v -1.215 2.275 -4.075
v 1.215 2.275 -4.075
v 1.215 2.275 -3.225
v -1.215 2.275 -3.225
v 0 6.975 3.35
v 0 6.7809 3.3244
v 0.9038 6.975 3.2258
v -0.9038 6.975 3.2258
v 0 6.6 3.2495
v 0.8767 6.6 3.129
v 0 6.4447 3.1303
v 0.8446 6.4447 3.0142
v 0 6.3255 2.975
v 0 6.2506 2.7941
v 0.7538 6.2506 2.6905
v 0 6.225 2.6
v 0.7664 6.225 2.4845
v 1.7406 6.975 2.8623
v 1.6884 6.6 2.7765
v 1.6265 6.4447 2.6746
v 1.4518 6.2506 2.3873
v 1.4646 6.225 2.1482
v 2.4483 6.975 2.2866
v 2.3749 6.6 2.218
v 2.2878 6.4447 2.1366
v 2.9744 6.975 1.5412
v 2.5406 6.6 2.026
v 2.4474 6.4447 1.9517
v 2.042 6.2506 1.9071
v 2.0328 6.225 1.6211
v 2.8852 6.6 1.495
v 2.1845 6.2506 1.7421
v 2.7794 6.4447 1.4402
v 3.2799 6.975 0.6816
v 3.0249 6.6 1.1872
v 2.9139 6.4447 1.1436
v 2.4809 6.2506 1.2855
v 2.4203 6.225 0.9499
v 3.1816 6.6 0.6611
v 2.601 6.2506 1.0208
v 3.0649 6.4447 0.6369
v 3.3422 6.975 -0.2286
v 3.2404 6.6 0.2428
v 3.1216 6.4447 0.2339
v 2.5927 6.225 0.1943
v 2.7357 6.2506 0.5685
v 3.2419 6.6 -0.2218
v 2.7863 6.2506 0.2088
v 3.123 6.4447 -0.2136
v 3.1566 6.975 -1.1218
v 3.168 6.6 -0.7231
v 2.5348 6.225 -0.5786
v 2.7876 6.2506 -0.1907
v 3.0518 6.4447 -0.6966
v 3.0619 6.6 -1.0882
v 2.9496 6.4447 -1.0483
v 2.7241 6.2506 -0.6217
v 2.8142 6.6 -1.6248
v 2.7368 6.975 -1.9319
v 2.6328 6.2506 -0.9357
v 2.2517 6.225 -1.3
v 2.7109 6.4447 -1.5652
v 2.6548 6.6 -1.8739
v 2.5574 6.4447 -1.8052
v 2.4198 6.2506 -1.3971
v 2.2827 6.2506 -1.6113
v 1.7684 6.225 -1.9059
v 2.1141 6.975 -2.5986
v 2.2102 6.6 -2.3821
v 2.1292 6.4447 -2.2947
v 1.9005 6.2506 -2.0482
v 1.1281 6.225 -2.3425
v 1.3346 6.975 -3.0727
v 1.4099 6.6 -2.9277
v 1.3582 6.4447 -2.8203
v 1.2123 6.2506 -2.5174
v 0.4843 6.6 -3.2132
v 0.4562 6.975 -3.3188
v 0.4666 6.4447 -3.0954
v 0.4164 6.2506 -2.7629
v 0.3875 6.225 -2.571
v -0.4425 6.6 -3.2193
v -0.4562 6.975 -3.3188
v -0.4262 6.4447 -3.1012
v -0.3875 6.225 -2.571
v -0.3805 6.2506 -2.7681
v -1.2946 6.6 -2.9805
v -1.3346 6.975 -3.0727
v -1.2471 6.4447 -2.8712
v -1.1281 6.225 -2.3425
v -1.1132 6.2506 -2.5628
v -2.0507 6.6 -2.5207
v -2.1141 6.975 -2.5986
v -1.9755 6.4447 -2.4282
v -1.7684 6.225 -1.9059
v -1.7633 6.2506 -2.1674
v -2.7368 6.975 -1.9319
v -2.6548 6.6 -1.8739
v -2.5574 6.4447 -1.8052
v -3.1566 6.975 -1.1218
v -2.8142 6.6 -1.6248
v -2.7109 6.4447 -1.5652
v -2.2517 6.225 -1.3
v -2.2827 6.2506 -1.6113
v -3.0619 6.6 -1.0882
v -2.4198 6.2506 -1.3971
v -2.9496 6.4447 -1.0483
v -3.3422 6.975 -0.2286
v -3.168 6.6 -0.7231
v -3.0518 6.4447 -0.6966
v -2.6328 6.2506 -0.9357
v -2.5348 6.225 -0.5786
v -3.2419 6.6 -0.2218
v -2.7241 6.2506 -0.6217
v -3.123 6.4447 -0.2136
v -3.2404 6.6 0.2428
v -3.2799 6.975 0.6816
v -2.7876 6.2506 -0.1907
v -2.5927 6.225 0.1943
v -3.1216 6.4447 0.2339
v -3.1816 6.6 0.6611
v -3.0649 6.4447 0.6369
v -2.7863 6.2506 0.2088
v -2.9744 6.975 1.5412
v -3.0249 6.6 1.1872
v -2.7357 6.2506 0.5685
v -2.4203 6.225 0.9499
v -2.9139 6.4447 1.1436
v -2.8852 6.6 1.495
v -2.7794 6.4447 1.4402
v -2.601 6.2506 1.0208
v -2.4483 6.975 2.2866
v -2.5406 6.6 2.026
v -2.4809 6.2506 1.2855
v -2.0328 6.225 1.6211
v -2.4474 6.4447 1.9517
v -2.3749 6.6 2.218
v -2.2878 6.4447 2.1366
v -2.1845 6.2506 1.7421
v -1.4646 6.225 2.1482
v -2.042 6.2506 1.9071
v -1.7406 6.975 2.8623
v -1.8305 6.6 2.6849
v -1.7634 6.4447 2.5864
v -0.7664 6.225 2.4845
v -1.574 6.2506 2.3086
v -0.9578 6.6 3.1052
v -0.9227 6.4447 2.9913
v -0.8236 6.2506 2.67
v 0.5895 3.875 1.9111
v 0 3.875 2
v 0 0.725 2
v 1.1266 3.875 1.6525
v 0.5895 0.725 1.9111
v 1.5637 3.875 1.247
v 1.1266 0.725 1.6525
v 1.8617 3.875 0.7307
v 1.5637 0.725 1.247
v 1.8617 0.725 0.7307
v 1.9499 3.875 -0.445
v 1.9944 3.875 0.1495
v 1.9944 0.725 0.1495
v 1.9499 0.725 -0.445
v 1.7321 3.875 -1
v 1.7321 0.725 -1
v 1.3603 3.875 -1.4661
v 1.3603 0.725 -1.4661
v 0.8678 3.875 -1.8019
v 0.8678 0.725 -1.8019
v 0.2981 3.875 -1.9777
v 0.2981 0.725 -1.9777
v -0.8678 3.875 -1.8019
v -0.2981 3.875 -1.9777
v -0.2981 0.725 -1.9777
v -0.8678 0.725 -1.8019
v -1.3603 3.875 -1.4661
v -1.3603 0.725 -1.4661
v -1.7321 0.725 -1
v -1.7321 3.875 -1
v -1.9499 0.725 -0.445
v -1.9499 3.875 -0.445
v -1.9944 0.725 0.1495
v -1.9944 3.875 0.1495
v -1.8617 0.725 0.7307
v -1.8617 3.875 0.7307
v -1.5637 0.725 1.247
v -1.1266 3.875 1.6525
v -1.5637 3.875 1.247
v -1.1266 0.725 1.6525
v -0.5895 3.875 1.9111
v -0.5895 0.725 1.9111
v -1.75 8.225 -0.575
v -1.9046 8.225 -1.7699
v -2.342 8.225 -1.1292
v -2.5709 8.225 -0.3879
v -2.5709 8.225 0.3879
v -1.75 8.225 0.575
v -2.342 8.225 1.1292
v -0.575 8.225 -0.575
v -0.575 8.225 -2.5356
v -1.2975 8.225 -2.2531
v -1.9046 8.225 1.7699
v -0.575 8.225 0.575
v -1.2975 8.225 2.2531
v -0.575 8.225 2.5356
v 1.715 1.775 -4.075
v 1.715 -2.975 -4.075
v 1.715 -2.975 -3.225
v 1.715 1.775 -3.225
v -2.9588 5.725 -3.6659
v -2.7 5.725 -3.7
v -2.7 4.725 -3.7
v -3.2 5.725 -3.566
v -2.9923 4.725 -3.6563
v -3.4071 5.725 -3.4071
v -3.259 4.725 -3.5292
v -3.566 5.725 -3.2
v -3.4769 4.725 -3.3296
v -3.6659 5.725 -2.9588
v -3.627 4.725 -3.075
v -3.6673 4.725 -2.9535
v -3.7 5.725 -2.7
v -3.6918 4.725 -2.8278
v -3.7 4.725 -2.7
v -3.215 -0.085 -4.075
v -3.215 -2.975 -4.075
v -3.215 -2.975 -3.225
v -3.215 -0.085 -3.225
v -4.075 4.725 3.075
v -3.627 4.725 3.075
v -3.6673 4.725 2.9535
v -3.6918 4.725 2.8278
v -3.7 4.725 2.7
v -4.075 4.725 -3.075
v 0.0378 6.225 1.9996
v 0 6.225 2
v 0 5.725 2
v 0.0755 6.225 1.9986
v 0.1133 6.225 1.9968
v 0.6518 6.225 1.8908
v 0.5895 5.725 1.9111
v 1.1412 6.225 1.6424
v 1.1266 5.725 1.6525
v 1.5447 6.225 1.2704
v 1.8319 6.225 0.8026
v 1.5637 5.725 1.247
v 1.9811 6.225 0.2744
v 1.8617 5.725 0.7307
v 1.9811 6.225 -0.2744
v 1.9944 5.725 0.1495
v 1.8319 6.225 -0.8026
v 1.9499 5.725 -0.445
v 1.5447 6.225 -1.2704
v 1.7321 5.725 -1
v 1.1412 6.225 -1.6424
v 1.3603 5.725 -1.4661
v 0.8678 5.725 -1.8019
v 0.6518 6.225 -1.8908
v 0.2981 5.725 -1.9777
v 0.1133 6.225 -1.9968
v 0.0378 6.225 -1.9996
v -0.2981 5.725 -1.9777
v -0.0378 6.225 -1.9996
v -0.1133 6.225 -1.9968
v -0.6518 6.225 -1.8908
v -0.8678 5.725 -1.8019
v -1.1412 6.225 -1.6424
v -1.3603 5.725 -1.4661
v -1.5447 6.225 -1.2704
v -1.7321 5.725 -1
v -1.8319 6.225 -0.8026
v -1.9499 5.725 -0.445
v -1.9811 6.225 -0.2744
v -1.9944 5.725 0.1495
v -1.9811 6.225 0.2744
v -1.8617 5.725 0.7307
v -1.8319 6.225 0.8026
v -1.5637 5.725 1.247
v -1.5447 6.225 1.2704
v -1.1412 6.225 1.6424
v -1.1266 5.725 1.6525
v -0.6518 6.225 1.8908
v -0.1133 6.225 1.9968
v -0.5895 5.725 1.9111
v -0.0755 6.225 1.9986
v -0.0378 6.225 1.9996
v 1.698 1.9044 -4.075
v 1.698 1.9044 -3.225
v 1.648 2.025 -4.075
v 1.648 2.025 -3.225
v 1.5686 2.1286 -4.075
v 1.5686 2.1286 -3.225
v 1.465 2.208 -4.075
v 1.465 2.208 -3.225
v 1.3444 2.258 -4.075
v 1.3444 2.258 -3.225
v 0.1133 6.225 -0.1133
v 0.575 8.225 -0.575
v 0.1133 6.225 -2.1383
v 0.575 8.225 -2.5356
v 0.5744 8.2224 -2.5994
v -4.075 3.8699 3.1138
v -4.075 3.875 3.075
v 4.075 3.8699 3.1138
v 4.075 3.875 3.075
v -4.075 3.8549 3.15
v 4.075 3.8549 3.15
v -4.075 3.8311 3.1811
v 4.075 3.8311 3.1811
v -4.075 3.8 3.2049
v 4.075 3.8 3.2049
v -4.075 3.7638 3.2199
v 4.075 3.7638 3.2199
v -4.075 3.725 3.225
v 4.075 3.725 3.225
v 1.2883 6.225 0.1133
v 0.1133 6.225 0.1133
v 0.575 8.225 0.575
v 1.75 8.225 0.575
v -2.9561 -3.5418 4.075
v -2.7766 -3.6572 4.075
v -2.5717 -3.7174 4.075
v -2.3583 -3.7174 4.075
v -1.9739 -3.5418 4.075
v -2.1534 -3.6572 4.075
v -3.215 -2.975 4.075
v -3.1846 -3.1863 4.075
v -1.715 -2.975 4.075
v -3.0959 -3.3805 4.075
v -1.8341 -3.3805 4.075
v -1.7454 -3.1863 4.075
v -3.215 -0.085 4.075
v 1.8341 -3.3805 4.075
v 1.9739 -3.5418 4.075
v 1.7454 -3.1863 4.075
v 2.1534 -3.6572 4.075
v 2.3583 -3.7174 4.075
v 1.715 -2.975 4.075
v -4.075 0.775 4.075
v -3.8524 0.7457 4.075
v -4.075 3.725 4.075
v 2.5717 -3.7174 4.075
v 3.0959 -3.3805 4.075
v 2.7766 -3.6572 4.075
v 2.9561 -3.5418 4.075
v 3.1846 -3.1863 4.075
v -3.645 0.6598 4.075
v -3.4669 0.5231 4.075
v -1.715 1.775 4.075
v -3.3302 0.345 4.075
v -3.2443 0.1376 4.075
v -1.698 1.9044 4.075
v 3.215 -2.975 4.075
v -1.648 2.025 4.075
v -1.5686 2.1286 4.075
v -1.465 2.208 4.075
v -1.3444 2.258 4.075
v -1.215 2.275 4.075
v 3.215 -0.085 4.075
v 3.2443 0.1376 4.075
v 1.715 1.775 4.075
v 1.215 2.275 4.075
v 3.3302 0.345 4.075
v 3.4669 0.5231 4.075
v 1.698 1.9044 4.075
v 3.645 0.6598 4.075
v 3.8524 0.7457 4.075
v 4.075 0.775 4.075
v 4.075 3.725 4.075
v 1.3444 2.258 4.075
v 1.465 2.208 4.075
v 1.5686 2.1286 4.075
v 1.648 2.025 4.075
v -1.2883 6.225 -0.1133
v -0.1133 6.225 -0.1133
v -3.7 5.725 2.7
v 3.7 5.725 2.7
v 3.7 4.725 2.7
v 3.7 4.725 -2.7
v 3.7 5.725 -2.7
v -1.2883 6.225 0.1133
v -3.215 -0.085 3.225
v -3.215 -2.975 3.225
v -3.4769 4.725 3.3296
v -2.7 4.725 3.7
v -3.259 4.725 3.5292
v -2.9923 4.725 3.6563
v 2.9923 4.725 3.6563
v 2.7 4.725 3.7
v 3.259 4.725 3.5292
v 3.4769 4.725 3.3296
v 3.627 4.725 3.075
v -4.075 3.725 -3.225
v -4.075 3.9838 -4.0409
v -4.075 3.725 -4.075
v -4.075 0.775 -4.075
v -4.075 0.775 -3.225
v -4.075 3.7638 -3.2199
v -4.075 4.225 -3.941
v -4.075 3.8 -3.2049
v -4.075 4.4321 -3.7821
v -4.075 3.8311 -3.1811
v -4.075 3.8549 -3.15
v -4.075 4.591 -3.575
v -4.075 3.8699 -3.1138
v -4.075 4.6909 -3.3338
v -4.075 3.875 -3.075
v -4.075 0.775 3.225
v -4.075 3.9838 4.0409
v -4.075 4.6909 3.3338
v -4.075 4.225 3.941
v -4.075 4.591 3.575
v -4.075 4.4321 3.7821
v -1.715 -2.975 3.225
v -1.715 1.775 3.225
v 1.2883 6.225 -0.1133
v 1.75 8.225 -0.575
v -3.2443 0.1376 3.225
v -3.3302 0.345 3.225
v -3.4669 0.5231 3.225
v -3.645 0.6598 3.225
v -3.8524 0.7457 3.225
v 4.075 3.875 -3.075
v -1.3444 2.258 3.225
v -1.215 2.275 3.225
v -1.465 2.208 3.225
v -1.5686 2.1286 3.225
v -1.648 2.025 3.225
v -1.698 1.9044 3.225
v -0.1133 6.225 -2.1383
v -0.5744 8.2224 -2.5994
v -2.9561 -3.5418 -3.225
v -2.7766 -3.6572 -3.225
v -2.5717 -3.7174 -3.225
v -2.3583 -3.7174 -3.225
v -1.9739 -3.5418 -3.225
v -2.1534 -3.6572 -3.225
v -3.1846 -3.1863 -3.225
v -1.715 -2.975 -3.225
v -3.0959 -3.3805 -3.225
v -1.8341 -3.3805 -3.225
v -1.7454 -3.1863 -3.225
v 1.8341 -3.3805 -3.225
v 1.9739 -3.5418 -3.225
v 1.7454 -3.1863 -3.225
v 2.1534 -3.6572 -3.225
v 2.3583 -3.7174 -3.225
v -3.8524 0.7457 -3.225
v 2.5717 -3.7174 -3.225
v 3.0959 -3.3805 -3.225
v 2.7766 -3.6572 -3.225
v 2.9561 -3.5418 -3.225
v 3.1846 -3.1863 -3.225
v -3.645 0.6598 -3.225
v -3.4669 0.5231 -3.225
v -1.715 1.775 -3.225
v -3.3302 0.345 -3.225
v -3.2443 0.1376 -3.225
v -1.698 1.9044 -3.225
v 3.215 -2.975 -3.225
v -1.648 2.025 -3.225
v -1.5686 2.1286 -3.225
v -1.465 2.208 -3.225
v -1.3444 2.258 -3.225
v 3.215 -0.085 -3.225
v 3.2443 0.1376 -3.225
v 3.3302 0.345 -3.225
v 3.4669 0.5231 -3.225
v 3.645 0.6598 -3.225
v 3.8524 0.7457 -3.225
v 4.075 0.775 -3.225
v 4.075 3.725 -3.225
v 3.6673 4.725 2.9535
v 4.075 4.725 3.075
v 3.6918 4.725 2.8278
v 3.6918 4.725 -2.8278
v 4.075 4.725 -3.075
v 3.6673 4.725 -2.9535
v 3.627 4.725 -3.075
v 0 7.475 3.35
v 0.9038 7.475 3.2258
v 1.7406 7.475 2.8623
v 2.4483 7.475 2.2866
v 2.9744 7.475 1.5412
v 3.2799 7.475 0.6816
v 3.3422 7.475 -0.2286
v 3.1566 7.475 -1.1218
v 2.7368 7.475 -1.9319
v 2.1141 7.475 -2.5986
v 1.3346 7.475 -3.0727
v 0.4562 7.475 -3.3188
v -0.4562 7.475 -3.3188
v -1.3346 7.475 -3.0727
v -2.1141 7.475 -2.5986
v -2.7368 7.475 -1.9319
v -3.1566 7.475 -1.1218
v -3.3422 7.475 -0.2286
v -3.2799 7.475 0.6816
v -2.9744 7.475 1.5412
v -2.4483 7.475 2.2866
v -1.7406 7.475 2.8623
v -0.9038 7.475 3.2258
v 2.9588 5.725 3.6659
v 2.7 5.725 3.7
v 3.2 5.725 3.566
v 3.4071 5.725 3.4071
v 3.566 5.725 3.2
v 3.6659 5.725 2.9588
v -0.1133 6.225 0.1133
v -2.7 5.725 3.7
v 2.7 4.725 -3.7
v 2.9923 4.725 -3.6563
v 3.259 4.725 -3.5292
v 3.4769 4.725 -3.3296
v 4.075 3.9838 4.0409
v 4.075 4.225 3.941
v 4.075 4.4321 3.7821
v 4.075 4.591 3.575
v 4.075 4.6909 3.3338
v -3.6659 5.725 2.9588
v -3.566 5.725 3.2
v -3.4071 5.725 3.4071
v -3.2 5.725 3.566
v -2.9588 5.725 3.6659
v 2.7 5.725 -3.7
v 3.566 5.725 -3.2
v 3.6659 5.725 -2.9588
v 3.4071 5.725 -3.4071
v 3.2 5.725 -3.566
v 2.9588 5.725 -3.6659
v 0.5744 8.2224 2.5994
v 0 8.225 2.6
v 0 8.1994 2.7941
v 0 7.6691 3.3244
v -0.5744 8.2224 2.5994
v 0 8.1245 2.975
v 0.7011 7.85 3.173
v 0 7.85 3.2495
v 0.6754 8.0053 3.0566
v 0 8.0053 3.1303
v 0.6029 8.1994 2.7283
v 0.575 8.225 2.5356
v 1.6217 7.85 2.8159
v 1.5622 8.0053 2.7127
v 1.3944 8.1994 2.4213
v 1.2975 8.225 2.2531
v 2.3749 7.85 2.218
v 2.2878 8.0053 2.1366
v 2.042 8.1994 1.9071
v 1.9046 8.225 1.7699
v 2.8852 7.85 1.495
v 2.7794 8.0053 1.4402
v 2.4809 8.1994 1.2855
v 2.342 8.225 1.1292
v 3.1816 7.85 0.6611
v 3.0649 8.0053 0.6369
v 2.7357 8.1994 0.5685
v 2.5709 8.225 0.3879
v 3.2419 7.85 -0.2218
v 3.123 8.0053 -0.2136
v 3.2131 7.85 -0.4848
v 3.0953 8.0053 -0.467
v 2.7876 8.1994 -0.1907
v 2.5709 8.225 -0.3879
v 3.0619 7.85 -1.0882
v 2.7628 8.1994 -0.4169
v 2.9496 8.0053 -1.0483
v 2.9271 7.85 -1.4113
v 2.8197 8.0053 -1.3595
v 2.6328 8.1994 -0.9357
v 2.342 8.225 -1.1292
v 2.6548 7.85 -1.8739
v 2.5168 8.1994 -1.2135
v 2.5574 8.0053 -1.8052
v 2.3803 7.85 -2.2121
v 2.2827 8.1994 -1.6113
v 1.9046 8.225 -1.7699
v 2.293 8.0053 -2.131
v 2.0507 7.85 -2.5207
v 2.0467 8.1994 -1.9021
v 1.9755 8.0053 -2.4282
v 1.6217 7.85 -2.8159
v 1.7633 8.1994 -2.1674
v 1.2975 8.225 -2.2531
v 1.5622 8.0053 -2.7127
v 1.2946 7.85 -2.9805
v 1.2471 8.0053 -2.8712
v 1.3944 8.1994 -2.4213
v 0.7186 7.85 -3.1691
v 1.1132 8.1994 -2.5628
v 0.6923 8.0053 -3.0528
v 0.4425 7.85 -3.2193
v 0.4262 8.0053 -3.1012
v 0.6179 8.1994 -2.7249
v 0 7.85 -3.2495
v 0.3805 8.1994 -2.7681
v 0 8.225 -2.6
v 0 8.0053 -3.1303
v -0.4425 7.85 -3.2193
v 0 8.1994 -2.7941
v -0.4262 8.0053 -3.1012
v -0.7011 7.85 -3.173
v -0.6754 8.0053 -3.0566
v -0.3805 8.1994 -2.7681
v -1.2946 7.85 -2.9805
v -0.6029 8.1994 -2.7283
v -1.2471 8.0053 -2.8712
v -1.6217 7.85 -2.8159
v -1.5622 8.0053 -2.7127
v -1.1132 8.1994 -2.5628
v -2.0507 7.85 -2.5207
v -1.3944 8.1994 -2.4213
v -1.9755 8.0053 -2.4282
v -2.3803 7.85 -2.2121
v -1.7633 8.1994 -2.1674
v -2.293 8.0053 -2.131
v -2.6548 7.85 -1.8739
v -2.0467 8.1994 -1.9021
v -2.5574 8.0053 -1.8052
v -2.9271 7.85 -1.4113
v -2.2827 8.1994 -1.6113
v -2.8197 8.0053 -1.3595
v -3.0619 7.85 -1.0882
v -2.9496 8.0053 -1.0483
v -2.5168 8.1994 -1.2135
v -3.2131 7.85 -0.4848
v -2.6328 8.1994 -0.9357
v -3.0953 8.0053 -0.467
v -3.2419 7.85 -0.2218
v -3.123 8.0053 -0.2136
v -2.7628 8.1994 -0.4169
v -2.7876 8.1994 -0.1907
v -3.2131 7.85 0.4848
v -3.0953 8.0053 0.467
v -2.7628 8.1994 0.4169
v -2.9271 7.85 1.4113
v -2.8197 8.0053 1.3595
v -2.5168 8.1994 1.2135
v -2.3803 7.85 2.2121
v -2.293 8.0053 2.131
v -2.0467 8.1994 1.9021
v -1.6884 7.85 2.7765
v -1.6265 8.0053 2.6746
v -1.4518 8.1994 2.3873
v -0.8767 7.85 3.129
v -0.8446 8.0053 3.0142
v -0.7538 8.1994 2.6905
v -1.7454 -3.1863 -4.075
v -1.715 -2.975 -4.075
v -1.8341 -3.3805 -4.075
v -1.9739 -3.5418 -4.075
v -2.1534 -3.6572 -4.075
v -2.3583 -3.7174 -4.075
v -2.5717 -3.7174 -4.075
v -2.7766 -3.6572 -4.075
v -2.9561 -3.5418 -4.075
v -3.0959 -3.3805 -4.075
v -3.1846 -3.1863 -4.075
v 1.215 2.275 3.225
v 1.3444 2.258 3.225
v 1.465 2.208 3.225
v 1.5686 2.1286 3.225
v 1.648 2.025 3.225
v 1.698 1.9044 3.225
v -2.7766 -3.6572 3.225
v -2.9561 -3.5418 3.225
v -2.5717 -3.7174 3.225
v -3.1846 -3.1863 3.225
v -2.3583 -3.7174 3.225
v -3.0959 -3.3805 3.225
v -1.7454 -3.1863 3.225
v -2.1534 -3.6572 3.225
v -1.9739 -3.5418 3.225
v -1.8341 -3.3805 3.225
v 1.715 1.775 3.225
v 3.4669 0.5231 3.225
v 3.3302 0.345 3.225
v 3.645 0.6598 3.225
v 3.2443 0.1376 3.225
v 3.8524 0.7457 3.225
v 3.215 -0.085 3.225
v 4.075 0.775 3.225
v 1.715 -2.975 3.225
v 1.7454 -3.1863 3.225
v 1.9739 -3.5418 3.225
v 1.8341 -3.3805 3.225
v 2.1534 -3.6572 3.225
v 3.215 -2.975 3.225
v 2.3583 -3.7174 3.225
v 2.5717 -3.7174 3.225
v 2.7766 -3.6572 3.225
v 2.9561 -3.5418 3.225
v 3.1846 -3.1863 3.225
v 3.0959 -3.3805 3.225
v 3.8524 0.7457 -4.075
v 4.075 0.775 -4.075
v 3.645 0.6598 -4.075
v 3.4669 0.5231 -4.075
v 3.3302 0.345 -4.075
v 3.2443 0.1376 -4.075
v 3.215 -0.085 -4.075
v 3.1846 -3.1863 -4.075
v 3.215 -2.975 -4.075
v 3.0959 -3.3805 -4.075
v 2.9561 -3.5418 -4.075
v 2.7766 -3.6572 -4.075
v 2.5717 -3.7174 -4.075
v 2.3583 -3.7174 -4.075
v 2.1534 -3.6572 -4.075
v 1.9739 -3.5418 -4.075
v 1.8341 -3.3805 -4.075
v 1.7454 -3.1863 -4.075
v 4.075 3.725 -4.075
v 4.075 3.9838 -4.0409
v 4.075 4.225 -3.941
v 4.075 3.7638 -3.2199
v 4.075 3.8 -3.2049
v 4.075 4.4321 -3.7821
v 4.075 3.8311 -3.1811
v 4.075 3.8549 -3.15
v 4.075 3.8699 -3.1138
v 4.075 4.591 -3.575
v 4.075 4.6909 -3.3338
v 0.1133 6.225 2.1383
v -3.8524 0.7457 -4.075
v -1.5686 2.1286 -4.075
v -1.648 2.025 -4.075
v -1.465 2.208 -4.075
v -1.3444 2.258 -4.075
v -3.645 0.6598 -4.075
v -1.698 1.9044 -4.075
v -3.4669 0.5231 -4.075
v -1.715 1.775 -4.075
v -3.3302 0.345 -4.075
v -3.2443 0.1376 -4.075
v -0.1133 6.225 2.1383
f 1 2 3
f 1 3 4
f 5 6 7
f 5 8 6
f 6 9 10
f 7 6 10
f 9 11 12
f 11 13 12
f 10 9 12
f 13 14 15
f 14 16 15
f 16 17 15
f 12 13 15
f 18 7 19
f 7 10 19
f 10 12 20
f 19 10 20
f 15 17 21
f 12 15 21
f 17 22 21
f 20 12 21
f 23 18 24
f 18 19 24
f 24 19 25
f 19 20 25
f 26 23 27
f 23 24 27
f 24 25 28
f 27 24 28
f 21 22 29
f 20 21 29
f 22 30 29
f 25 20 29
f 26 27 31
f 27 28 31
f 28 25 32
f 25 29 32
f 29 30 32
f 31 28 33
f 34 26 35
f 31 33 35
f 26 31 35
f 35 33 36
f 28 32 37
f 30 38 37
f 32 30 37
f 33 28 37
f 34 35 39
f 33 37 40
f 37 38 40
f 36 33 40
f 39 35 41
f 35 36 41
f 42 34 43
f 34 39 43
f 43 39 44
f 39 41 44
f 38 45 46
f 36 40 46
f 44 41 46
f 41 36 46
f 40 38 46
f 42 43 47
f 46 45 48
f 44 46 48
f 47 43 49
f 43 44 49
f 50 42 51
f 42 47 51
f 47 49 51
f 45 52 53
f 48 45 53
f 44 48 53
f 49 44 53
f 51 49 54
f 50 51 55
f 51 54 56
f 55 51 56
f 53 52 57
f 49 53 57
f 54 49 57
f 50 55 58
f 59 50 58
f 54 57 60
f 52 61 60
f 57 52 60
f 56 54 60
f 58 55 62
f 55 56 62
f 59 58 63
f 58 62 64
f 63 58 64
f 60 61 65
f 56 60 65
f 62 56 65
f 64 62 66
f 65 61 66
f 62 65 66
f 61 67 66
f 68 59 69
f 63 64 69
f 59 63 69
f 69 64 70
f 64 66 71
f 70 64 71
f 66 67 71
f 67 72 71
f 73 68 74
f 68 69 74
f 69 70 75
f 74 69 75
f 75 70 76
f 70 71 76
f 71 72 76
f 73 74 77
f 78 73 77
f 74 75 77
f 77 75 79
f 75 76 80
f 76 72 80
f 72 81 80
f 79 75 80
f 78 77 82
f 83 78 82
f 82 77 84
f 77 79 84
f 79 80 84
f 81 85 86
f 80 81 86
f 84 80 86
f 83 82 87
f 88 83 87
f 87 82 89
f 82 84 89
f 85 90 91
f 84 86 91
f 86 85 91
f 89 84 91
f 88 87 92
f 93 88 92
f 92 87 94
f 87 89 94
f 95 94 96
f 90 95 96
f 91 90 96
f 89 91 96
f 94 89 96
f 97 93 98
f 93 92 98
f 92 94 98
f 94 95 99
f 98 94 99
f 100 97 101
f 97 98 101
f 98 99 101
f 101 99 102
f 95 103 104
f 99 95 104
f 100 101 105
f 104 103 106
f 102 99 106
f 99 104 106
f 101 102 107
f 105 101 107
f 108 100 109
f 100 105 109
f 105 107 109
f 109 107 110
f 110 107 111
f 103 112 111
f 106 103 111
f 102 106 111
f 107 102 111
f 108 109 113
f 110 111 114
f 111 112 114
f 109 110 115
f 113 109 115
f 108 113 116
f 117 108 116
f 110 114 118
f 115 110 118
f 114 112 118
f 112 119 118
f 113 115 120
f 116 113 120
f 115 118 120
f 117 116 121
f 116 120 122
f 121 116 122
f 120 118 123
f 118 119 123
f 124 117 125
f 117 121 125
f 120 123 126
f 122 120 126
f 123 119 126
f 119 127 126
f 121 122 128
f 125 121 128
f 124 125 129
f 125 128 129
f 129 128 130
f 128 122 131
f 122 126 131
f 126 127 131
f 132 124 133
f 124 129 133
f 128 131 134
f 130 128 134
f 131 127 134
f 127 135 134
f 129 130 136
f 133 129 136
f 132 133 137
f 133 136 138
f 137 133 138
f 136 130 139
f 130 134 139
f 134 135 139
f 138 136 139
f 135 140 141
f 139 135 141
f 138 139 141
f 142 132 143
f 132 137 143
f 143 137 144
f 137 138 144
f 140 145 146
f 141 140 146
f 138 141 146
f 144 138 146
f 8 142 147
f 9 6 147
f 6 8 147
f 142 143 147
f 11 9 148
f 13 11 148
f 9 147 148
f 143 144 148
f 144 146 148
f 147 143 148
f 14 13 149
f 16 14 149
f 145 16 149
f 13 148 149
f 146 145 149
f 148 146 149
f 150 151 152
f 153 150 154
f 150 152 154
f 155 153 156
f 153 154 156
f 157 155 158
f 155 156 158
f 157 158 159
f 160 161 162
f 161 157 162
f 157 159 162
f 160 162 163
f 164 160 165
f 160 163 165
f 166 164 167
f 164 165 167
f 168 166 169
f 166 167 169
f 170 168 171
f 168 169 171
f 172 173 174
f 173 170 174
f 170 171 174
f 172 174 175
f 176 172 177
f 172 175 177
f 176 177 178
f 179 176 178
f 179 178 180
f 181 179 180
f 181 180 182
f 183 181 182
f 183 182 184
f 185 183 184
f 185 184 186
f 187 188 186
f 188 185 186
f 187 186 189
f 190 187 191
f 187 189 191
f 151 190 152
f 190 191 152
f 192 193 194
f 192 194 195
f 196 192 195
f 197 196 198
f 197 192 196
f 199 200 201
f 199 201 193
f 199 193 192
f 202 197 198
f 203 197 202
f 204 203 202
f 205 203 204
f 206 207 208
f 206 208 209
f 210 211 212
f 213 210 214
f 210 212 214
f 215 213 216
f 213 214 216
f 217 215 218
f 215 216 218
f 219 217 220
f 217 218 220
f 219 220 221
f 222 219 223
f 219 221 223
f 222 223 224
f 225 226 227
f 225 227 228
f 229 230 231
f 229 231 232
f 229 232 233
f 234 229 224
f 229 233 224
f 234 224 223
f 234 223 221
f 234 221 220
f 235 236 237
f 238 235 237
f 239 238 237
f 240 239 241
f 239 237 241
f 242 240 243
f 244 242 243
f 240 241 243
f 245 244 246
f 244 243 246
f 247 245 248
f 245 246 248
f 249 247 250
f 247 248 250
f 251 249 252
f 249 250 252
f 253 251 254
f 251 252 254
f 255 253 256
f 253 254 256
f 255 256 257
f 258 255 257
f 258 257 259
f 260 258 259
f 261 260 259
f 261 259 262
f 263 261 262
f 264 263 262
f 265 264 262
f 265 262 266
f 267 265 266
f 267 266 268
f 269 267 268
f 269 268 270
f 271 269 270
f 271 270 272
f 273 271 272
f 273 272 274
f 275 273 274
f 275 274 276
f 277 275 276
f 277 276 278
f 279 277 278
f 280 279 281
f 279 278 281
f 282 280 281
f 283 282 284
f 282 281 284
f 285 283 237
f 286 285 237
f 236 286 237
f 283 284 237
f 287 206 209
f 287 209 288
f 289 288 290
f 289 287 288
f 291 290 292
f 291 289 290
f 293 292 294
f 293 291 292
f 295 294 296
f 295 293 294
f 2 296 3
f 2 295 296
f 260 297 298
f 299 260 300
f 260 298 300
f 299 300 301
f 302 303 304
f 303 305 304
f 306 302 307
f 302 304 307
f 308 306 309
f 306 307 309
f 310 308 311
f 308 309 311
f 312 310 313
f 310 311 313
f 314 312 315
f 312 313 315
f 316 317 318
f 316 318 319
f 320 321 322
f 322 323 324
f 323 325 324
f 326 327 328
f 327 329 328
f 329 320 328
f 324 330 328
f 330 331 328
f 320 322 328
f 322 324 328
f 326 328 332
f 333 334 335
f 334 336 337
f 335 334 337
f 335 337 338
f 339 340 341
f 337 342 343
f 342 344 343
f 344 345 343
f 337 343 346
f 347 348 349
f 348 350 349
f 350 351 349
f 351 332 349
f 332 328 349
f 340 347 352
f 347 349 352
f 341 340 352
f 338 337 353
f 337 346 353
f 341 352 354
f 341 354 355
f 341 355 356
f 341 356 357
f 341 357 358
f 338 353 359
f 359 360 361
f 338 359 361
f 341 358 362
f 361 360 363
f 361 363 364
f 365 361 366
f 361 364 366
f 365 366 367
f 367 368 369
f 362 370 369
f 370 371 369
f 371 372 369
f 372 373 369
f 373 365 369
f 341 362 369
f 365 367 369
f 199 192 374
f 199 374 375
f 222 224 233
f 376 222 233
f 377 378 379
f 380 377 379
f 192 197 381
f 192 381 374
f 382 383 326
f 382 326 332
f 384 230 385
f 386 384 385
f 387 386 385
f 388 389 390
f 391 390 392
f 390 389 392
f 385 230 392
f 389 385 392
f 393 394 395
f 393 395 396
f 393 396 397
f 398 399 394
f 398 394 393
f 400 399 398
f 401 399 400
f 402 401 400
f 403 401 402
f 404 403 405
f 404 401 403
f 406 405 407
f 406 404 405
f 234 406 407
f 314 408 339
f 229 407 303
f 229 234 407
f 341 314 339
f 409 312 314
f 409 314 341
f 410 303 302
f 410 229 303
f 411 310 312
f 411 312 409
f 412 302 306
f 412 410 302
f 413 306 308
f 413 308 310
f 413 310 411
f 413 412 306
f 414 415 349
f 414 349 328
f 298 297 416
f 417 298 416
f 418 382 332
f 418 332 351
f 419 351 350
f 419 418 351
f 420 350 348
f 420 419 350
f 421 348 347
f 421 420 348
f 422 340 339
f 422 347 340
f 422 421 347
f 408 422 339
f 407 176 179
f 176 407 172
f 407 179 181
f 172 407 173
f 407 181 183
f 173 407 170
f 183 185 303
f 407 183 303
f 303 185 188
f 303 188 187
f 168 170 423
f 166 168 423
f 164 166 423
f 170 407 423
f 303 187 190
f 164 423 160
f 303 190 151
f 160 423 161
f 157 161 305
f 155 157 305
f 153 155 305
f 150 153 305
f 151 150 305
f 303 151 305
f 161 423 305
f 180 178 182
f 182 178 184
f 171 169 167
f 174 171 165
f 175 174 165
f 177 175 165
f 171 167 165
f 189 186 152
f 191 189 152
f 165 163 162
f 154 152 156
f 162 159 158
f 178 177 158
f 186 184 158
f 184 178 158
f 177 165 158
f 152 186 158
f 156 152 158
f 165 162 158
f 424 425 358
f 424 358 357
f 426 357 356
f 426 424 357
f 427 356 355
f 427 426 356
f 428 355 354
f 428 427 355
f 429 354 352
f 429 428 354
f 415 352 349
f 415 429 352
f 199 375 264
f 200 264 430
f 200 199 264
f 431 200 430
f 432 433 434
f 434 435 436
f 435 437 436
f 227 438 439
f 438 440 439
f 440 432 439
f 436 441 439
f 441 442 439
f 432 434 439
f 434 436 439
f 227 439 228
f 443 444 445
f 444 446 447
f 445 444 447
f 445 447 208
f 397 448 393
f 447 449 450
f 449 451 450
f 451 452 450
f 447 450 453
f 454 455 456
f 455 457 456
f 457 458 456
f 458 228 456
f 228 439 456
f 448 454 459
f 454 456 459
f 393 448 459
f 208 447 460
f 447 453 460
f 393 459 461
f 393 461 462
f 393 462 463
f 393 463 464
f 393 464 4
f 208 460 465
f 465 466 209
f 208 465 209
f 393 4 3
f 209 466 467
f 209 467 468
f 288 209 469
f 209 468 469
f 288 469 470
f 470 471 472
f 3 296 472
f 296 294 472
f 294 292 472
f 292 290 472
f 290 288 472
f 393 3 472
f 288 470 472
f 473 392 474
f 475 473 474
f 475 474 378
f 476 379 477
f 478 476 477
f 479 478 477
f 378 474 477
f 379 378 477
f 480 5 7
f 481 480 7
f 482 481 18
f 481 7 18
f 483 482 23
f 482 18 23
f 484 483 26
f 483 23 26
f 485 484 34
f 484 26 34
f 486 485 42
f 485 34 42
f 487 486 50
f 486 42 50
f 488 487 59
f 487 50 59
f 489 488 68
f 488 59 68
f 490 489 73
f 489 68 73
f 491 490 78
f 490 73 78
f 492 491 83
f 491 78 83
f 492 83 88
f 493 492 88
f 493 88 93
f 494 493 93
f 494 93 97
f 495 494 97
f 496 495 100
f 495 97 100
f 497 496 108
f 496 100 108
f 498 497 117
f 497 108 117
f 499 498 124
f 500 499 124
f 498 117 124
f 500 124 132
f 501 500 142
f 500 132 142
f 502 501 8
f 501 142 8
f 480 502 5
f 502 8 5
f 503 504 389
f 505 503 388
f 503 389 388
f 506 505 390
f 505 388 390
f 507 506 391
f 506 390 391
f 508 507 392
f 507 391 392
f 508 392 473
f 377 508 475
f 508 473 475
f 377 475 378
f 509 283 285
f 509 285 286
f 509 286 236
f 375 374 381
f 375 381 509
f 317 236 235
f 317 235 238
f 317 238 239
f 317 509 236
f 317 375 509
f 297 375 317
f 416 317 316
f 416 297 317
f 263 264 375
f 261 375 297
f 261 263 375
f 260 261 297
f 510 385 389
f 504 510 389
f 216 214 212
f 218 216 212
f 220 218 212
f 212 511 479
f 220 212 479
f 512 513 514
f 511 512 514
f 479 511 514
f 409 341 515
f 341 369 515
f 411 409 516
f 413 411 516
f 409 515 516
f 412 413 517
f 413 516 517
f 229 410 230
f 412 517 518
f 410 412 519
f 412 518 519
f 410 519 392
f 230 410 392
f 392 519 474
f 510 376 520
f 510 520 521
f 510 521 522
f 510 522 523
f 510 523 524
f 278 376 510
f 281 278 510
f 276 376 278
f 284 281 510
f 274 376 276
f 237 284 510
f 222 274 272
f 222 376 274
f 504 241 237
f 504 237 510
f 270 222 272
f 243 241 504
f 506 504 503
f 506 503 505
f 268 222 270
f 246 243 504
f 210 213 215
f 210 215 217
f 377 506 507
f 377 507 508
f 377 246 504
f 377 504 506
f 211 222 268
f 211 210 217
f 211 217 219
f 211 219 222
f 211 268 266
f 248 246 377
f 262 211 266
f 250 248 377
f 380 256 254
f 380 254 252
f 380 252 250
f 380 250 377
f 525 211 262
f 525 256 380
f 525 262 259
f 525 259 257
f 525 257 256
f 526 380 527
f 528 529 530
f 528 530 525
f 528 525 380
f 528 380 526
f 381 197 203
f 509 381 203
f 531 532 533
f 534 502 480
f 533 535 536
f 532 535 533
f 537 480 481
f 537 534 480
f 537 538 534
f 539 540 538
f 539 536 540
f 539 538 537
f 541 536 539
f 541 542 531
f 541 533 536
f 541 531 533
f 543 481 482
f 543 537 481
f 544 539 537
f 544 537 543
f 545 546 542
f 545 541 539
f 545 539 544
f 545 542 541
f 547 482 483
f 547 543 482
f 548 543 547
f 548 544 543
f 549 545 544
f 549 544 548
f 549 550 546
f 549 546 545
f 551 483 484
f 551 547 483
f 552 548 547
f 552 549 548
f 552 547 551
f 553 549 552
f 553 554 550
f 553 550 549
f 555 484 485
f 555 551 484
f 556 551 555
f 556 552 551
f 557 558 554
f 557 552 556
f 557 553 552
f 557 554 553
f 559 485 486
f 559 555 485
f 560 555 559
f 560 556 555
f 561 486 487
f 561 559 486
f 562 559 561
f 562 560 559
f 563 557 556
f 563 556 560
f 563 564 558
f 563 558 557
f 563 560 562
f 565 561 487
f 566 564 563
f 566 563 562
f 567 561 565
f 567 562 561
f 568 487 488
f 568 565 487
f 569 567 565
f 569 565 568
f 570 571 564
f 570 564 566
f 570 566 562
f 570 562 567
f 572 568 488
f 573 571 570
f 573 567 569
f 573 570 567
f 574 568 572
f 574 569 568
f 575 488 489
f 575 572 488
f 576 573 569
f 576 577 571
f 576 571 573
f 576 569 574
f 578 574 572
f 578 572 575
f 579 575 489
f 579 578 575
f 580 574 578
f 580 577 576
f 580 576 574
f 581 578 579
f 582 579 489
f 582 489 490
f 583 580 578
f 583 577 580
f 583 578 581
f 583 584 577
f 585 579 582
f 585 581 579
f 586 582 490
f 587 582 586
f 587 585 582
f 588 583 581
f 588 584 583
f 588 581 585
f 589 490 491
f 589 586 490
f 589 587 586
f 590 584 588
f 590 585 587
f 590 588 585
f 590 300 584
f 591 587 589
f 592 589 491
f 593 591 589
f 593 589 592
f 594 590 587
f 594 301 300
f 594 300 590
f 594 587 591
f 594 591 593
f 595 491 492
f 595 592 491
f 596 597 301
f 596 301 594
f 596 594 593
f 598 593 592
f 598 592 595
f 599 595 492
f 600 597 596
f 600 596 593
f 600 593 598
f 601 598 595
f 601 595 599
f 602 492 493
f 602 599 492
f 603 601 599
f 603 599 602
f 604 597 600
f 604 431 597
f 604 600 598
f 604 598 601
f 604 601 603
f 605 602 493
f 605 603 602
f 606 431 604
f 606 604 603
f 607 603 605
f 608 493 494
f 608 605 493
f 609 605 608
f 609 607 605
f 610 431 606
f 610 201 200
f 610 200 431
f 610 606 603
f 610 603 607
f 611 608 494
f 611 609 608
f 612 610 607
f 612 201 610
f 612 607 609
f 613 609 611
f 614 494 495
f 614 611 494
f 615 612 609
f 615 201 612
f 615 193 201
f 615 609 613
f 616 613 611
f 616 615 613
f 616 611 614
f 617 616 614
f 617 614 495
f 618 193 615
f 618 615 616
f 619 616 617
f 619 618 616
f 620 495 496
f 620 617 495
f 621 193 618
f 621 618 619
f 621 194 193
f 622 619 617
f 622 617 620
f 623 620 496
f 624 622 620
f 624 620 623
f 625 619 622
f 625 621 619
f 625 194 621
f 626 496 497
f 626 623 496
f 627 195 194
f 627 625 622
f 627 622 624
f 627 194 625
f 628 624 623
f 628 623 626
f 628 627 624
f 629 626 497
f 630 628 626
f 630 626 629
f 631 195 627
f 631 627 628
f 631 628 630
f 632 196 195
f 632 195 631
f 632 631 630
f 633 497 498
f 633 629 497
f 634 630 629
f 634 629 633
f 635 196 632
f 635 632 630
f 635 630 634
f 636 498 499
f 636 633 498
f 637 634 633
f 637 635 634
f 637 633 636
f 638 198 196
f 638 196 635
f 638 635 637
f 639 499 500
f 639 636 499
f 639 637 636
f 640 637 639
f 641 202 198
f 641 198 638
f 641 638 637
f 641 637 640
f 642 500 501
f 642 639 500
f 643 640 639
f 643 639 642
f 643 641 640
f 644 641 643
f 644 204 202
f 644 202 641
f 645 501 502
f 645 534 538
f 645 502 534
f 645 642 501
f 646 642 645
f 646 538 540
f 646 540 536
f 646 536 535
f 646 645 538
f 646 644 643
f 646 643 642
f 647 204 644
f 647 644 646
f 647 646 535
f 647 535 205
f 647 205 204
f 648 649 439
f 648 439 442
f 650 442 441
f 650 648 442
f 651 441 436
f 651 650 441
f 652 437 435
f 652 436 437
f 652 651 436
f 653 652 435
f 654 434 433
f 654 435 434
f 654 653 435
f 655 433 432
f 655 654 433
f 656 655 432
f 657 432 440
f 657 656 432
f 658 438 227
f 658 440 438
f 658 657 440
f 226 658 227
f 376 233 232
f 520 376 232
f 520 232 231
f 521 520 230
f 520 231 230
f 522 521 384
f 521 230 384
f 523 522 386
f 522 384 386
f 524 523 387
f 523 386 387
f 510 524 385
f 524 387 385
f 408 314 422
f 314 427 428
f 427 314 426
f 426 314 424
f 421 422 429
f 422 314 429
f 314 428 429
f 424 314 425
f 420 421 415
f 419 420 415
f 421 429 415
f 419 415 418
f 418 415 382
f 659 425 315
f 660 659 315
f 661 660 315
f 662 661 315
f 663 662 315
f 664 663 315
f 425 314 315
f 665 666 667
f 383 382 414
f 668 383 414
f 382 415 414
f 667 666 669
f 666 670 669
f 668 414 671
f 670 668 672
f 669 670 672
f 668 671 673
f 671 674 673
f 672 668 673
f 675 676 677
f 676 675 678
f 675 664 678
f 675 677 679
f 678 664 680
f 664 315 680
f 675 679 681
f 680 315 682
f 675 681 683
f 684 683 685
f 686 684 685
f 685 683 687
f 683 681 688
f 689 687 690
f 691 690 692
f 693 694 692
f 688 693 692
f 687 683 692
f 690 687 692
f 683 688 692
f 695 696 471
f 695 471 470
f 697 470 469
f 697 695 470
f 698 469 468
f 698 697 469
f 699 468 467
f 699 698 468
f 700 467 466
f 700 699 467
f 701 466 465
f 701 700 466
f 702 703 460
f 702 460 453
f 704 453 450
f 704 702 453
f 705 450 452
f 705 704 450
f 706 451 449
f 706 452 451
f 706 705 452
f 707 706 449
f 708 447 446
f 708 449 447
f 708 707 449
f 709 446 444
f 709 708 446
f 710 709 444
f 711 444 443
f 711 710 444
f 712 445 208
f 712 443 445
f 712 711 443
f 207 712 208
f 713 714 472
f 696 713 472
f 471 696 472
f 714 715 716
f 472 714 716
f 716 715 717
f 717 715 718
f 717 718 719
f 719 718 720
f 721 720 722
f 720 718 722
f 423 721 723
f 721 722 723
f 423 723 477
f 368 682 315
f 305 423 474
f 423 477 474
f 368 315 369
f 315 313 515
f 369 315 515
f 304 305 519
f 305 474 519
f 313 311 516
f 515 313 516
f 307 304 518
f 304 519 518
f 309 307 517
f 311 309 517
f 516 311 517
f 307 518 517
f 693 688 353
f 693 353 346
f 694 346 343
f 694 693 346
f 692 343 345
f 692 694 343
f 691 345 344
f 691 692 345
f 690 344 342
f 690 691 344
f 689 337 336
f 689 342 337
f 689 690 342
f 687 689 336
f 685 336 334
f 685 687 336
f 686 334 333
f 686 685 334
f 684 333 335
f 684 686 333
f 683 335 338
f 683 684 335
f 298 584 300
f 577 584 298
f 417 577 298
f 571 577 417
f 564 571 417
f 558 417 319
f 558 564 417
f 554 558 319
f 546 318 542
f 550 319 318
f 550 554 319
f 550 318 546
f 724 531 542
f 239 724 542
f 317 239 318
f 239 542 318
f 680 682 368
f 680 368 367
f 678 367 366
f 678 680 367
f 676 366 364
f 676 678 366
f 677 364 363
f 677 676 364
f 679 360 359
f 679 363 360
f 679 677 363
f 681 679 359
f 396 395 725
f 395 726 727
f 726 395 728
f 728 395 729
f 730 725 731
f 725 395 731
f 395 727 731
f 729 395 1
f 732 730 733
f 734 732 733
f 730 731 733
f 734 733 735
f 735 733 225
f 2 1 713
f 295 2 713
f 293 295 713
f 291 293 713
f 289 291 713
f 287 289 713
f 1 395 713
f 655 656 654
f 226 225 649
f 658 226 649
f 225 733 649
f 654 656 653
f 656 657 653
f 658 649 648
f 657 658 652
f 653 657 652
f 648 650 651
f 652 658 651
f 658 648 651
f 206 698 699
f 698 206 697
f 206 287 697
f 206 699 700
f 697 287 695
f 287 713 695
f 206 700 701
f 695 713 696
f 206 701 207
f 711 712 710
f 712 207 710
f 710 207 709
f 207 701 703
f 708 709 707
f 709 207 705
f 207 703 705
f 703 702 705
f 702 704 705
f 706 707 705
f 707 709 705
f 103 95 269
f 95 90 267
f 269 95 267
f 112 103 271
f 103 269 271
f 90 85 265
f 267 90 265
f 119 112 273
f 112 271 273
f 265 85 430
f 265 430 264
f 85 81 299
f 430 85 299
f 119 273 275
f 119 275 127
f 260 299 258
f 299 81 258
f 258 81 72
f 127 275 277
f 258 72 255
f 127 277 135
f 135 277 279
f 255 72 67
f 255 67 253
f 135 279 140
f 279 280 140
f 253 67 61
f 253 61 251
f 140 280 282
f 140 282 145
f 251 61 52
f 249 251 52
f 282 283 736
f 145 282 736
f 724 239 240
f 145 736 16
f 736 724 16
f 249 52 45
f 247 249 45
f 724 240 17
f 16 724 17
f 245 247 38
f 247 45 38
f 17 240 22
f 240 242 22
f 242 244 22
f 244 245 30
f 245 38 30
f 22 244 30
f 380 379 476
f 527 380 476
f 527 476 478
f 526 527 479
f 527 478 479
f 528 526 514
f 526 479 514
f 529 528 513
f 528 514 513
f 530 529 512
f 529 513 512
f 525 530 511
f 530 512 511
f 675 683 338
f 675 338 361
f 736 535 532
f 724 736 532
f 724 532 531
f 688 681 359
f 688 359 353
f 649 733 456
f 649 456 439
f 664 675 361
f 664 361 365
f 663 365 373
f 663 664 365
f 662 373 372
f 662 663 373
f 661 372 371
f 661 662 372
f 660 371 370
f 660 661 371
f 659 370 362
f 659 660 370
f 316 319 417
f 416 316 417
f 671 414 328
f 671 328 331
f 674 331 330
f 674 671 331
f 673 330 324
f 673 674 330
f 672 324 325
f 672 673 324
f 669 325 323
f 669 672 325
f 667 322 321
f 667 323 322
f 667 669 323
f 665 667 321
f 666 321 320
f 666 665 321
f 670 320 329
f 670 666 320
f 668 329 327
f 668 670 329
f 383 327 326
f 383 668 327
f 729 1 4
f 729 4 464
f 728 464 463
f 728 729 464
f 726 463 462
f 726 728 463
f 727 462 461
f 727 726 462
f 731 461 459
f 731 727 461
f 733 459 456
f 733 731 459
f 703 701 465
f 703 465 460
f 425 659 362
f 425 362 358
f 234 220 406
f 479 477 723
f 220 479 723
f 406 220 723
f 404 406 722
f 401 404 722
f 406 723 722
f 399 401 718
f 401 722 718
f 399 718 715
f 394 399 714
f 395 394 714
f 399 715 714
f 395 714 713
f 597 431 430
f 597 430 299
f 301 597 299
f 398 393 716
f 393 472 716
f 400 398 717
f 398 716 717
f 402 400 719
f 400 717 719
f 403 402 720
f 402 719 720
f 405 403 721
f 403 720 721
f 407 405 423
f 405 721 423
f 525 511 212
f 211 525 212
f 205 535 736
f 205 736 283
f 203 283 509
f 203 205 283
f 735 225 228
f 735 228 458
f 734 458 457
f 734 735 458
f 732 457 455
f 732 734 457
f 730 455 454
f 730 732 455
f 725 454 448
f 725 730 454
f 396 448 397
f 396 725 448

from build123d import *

# Parameters (mm, degrees)
EXTRUDE_THIN1_DEPTH               = 4.075
CUT_EXTRUDE1_DEPTH                = 8.45230669
CUT_EXTRUDE1_DEPTH_BACK           = 8.45230669
BOSS_EXTRUDE1_DEPTH               = 1
BOSS_EXTRUDE2_DEPTH               = 0.5
BOSS_EXTRUDE2_DEPTH_BACK          = 5
SKETCH5_R                         = 2
SKETCH6_R                         = 3.35
BOSS_EXTRUDE3_DEPTH               = 2
FILLET1_R                         = 0.75
SKETCH7_W                         = 1.15
SKETCH7_H                         = 5.2
CUT_EXTRUDE_THIN1_DEPTH           = 2
CUT_EXTRUDE_THIN1_DRAFT           = -13
SKETCH7_W_2                       = 3.5
SKETCH7_H_2                       = 1.15
CUT_EXTRUDE_THIN1_PROFILE_2_DEPTH = 2
CUT_EXTRUDE_THIN1_PROFILE_2_DRAFT = -13


with BuildPart() as part:
    # Sketch1 → Extrude-Thin1 (new, symmetric)
    with BuildSketch(Plane(origin=(0, 0, 0), x_dir=(0, 0, -1), z_dir=(1, 0, 0))):
        with BuildLine():
            Line((-4.075, -3.725), (-4.075, 3.725))
            ThreePointArc((-4.075, 3.725), (-3.782106781, 4.432106781), (-3.075, 4.725))
            Line((-3.075, 4.725), (3.075, 4.725))
            ThreePointArc((3.075, 4.725), (3.782106781, 4.432106781), (4.075, 3.725))
            Line((4.075, 3.725), (4.075, -3.725))
            Line((4.075, -3.725), (3.225, -3.725))
            Line((3.225, -3.725), (3.225, 3.725))
            ThreePointArc((3.225, 3.725), (3.181066017, 3.831066017), (3.075, 3.875))
            Line((3.075, 3.875), (-3.075, 3.875))
            ThreePointArc((-3.075, 3.875), (-3.181066017, 3.831066017), (-3.225, 3.725))
            Line((-3.225, 3.725), (-3.225, -3.725))
            Line((-3.225, -3.725), (-4.075, -3.725))
        make_face()
    extrude(amount=EXTRUDE_THIN1_DEPTH, both=True)

    # Sketch3 → Cut-Extrude1 (cut, two sides: drawn at the far end of the back side and taken through both)
    with BuildSketch(Plane.XY.offset(-CUT_EXTRUDE1_DEPTH_BACK)):
        with BuildLine():
            Line((-1.715, -3.725), (1.715, -3.725))
            Line((1.715, -3.725), (1.715, -3.972782835))
            Line((1.715, -3.972782835), (3.215, -3.972782835))
            Line((3.215, -3.972782835), (3.215, -3.725))
            Line((3.215, -3.725), (4.075, -3.725))
            Line((4.075, -3.725), (4.075, 0.775))
            ThreePointArc((4.075, 0.775), (3.466888168, 0.523111832), (3.215, -0.085))
            Line((3.215, -0.085), (3.215, -2.975))
            ThreePointArc((3.215, -2.975), (2.465, -3.725), (1.715, -2.975))
            Line((1.715, -2.975), (1.715, 1.775))
            ThreePointArc((1.715, 1.775), (1.568553391, 2.128553391), (1.215, 2.275))
            Line((1.215, 2.275), (-1.215, 2.275))
            ThreePointArc((-1.215, 2.275), (-1.568553391, 2.128553391), (-1.715, 1.775))
            Line((-1.715, 1.775), (-1.715, -2.975))
            ThreePointArc((-1.715, -2.975), (-2.465, -3.725), (-3.215, -2.975))
            Line((-3.215, -2.975), (-3.215, -0.085))
            ThreePointArc((-3.215, -0.085), (-3.466888168, 0.523111832), (-4.075, 0.775))
            Line((-4.075, 0.775), (-4.075, -3.725))
            Line((-4.075, -3.725), (-3.215, -3.725))
            Line((-3.215, -3.725), (-3.215, -3.972782835))
            Line((-3.215, -3.972782835), (-1.715, -3.972782835))
            Line((-1.715, -3.972782835), (-1.715, -3.725))
        make_face()
    extrude(amount=CUT_EXTRUDE1_DEPTH + CUT_EXTRUDE1_DEPTH_BACK, mode=Mode.SUBTRACT)

    # Sketch4 → Boss-Extrude1 (add)
    with BuildSketch(Plane(origin=(0, 4.725, 0), x_dir=(1, 0, 0), z_dir=(0, 1, 0))):
        with BuildLine():
            Line((-2.7, -3.7), (2.7, -3.7))
            ThreePointArc((2.7, -3.7), (3.407106781, -3.407106781), (3.7, -2.7))
            Line((3.7, -2.7), (3.7, 2.7))
            ThreePointArc((3.7, 2.7), (3.407106781, 3.407106781), (2.7, 3.7))
            Line((2.7, 3.7), (-2.7, 3.7))
            ThreePointArc((-2.7, 3.7), (-3.407106781, 3.407106781), (-3.7, 2.7))
            Line((-3.7, 2.7), (-3.7, -2.7))
            ThreePointArc((-3.7, -2.7), (-3.407106781, -3.407106781), (-2.7, -3.7))
        make_face()
    extrude(amount=BOSS_EXTRUDE1_DEPTH)

    # Sketch5 → Boss-Extrude2 (add, two sides: drawn at the far end of the back side and taken through both)
    with BuildSketch(Plane(origin=(0, 5.725, 0), x_dir=(1, 0, 0), z_dir=(0, 1, 0)).offset(-BOSS_EXTRUDE2_DEPTH_BACK)):
        with Locations(Location((0, 0, 0), (0, 0, 270))):
            Circle(SKETCH5_R)
    extrude(amount=BOSS_EXTRUDE2_DEPTH + BOSS_EXTRUDE2_DEPTH_BACK)

    # Sketch6 → Boss-Extrude3 (add)
    with BuildSketch(Plane(origin=(0, 6.225, 0), x_dir=(1, 0, 0), z_dir=(0, 1, 0))):
        with Locations(Location((0, 0, 0), (0, 0, 270))):
            Circle(SKETCH6_R)
    extrude(amount=BOSS_EXTRUDE3_DEPTH)

    # Fillet1
    fillet1_edges = [part.edges().sort_by_distance(p)[0] for p in [
        (0, 6.225, -3.35),
        (0, 8.225, -3.35),
    ]]
    fillet(fillet1_edges, radius=FILLET1_R)


with BuildPart() as cut_extrude_thin1_tool:
    # Sketch7 → Cut-Extrude-Thin1 (with draft: the straight prism first)
    with BuildSketch(Plane(origin=(0, 8.225, 0), x_dir=(1, 0, 0), z_dir=(0, 1, 0))):
        Rectangle(SKETCH7_W, SKETCH7_H)
    extrude(amount=-CUT_EXTRUDE_THIN1_DEPTH)
    # Cut-Extrude-Thin1: the draft: its side faces are tilted about the plane it starts from
    cut_extrude_thin1_sides = [cut_extrude_thin1_tool.faces().sort_by_distance(p)[0] for p in [
        (-0.575, 7.225, 0),
        (0, 7.225, 2.6),
        (0.575, 7.225, 0),
        (0, 7.225, -2.6),
    ]]
    draft(cut_extrude_thin1_sides, Plane(origin=(0, 8.225, 0), x_dir=(1, 0, 0), z_dir=(0, 1, 0)), CUT_EXTRUDE_THIN1_DRAFT)


with BuildPart() as part_1:
    add(part.part)

    # Cut-Extrude-Thin1: cut by cut_extrude_thin1_tool
    add(cut_extrude_thin1_tool.part, mode=Mode.SUBTRACT)


with BuildPart() as cut_extrude_thin1_profile_2_tool:
    # Sketch7 → Cut-Extrude-Thin1 profile 2 (with draft: the straight prism first)
    with BuildSketch(Plane(origin=(0, 8.225, 0), x_dir=(1, 0, 0), z_dir=(0, 1, 0))):
        Rectangle(SKETCH7_W_2, SKETCH7_H_2)
    extrude(amount=-CUT_EXTRUDE_THIN1_PROFILE_2_DEPTH)
    # Cut-Extrude-Thin1 profile 2: the draft: its side faces are tilted about the plane it starts from
    cut_extrude_thin1_profile_2_sides = [cut_extrude_thin1_profile_2_tool.faces().sort_by_distance(p)[0] for p in [
        (0, 7.225, -0.575),
        (-1.75, 7.225, 0),
        (0, 7.225, 0.575),
        (1.75, 7.225, 0),
    ]]
    draft(cut_extrude_thin1_profile_2_sides, Plane(origin=(0, 8.225, 0), x_dir=(1, 0, 0), z_dir=(0, 1, 0)), CUT_EXTRUDE_THIN1_PROFILE_2_DRAFT)


with BuildPart() as part_2:
    add(part_1.part)

    # Cut-Extrude-Thin1 profile 2: cut by cut_extrude_thin1_profile_2_tool
    add(cut_extrude_thin1_profile_2_tool.part, mode=Mode.SUBTRACT)


solid = part_2.part
